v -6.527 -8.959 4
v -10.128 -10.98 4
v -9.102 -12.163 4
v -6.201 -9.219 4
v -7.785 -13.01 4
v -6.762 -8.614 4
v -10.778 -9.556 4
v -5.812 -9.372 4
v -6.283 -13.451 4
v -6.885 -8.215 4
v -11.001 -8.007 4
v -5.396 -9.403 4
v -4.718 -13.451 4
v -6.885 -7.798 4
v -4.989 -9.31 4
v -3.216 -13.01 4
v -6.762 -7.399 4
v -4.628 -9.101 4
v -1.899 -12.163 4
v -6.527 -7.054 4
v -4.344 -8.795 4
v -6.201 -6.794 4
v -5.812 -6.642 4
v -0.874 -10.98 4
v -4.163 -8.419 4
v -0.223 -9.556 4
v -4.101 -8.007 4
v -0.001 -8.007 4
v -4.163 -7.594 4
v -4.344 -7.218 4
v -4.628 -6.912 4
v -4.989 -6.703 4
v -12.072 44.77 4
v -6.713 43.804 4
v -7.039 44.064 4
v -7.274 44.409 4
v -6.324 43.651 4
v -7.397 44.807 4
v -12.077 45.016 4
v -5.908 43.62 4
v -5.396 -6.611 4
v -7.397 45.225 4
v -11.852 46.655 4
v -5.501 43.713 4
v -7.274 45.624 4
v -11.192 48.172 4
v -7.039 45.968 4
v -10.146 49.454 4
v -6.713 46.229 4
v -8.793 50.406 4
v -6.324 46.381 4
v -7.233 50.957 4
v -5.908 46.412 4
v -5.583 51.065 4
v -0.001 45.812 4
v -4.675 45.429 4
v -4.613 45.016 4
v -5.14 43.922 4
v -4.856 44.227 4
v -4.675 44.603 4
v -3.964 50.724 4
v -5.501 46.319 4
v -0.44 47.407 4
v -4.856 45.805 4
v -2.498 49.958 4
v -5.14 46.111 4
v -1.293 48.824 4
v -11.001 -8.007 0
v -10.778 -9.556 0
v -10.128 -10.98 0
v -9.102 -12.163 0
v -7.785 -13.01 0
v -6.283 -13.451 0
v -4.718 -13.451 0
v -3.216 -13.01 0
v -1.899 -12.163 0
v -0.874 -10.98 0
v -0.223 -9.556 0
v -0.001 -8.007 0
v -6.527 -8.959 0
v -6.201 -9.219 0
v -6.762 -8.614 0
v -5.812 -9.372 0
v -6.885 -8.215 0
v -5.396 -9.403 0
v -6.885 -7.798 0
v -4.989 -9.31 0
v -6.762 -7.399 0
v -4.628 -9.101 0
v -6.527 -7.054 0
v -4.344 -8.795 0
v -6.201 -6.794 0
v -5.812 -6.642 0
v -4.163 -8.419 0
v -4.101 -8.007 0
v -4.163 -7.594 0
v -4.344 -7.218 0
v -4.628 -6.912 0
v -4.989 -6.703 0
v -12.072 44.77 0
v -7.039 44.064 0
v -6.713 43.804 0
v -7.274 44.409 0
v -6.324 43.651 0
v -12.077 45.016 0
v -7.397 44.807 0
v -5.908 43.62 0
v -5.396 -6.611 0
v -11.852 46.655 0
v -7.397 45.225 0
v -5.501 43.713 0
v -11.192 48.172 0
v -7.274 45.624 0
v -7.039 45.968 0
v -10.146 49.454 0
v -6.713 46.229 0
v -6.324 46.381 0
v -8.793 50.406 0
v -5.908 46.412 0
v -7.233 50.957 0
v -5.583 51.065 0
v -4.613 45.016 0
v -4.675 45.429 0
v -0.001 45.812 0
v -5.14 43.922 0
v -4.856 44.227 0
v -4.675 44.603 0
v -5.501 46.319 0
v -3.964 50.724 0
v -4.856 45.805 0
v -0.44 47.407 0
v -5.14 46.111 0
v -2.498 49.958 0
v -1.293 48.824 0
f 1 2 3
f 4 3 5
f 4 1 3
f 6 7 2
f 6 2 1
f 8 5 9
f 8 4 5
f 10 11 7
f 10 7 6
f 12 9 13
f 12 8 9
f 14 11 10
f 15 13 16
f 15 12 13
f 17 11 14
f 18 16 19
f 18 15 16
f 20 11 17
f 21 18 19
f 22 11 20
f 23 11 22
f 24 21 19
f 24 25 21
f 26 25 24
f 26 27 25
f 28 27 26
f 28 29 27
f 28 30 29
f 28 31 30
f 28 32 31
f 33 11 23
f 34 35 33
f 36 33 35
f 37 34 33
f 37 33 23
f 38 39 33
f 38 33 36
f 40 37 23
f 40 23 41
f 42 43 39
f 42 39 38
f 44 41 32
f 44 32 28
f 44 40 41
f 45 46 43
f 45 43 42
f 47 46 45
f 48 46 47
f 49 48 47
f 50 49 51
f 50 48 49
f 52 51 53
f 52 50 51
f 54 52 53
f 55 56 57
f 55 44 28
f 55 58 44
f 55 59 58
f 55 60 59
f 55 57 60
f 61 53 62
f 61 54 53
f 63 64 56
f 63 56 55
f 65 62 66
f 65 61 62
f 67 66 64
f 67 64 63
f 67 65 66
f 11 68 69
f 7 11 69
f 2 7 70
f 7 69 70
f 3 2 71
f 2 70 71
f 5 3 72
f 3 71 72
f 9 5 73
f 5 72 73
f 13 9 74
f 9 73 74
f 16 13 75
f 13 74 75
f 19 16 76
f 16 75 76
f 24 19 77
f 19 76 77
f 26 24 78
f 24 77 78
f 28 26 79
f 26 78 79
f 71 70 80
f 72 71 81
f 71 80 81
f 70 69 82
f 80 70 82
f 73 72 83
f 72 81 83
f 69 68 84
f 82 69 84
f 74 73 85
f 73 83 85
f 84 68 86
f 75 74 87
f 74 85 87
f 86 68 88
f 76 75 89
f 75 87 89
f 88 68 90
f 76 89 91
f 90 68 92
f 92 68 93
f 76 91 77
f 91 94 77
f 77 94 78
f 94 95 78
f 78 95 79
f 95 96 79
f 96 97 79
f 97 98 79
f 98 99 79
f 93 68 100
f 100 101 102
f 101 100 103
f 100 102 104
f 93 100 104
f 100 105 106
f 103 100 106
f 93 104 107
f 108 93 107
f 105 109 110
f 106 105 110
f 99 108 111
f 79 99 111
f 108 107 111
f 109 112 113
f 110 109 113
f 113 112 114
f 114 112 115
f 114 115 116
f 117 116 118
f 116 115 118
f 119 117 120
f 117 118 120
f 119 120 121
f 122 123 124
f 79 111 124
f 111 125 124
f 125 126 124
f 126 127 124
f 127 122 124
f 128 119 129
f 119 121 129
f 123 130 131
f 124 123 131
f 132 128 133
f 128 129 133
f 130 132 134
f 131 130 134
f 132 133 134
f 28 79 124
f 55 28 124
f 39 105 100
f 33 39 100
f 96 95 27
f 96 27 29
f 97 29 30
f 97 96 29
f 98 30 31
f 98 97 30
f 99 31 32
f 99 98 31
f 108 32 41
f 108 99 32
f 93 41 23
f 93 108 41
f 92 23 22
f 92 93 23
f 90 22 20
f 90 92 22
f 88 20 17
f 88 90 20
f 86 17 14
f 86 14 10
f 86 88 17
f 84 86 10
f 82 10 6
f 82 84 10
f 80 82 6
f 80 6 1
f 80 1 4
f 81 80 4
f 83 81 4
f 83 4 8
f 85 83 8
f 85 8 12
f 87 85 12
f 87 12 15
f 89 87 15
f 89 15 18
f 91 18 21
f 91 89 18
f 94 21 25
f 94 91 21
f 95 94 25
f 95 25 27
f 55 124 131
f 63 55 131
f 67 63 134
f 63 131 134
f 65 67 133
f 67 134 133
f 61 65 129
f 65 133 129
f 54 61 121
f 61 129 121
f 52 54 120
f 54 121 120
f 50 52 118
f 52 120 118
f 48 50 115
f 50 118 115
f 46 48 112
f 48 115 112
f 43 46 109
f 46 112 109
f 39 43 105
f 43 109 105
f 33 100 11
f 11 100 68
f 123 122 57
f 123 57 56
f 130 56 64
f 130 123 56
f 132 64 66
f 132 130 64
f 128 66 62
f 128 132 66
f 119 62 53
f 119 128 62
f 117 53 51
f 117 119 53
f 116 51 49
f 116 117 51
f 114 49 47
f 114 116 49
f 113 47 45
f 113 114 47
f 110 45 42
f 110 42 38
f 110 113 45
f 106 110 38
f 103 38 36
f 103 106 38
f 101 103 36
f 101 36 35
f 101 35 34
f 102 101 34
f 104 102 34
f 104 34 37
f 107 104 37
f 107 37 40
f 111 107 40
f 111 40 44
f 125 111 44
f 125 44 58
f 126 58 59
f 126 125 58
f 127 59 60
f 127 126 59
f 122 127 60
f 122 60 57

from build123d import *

# Parameters (mm, degrees)
SKETCH1_R           = 1.4
BOSS_EXTRUDE1_DEPTH = 4


with BuildPart() as part:
    # Sketch1 → Boss-Extrude1 (new body)
    with BuildSketch(Plane.XY):
        with BuildLine():
            ThreePointArc((-11.000688459, -8.006682704), (-5.500688459, -13.506682704), (-0.000688459, -8.006682704))
            Line((-0.000688459, -8.006682704), (-0.000688459, 44.219898035))
            Line((-0.000688459, 44.219898035), (-0.000688459, 45.812285407))
            ThreePointArc((-0.000688459, 45.812285407), (-6.411717433, 51.067514262), (-12.077316081, 45.016091721))
            Line((-12.077316081, 45.016091721), (-12.072317389, 44.769911406))
            Line((-12.072317389, 44.769911406), (-11.000688459, -8.006682704))
        make_face()
        with Locations((-5.500688459, -8.006682704)):
            Circle(SKETCH1_R, mode=Mode.SUBTRACT)
        with Locations((-6.012756351, 45.016091721)):
            Circle(SKETCH1_R, mode=Mode.SUBTRACT)
    extrude(amount=BOSS_EXTRUDE1_DEPTH)


solid = part.part
